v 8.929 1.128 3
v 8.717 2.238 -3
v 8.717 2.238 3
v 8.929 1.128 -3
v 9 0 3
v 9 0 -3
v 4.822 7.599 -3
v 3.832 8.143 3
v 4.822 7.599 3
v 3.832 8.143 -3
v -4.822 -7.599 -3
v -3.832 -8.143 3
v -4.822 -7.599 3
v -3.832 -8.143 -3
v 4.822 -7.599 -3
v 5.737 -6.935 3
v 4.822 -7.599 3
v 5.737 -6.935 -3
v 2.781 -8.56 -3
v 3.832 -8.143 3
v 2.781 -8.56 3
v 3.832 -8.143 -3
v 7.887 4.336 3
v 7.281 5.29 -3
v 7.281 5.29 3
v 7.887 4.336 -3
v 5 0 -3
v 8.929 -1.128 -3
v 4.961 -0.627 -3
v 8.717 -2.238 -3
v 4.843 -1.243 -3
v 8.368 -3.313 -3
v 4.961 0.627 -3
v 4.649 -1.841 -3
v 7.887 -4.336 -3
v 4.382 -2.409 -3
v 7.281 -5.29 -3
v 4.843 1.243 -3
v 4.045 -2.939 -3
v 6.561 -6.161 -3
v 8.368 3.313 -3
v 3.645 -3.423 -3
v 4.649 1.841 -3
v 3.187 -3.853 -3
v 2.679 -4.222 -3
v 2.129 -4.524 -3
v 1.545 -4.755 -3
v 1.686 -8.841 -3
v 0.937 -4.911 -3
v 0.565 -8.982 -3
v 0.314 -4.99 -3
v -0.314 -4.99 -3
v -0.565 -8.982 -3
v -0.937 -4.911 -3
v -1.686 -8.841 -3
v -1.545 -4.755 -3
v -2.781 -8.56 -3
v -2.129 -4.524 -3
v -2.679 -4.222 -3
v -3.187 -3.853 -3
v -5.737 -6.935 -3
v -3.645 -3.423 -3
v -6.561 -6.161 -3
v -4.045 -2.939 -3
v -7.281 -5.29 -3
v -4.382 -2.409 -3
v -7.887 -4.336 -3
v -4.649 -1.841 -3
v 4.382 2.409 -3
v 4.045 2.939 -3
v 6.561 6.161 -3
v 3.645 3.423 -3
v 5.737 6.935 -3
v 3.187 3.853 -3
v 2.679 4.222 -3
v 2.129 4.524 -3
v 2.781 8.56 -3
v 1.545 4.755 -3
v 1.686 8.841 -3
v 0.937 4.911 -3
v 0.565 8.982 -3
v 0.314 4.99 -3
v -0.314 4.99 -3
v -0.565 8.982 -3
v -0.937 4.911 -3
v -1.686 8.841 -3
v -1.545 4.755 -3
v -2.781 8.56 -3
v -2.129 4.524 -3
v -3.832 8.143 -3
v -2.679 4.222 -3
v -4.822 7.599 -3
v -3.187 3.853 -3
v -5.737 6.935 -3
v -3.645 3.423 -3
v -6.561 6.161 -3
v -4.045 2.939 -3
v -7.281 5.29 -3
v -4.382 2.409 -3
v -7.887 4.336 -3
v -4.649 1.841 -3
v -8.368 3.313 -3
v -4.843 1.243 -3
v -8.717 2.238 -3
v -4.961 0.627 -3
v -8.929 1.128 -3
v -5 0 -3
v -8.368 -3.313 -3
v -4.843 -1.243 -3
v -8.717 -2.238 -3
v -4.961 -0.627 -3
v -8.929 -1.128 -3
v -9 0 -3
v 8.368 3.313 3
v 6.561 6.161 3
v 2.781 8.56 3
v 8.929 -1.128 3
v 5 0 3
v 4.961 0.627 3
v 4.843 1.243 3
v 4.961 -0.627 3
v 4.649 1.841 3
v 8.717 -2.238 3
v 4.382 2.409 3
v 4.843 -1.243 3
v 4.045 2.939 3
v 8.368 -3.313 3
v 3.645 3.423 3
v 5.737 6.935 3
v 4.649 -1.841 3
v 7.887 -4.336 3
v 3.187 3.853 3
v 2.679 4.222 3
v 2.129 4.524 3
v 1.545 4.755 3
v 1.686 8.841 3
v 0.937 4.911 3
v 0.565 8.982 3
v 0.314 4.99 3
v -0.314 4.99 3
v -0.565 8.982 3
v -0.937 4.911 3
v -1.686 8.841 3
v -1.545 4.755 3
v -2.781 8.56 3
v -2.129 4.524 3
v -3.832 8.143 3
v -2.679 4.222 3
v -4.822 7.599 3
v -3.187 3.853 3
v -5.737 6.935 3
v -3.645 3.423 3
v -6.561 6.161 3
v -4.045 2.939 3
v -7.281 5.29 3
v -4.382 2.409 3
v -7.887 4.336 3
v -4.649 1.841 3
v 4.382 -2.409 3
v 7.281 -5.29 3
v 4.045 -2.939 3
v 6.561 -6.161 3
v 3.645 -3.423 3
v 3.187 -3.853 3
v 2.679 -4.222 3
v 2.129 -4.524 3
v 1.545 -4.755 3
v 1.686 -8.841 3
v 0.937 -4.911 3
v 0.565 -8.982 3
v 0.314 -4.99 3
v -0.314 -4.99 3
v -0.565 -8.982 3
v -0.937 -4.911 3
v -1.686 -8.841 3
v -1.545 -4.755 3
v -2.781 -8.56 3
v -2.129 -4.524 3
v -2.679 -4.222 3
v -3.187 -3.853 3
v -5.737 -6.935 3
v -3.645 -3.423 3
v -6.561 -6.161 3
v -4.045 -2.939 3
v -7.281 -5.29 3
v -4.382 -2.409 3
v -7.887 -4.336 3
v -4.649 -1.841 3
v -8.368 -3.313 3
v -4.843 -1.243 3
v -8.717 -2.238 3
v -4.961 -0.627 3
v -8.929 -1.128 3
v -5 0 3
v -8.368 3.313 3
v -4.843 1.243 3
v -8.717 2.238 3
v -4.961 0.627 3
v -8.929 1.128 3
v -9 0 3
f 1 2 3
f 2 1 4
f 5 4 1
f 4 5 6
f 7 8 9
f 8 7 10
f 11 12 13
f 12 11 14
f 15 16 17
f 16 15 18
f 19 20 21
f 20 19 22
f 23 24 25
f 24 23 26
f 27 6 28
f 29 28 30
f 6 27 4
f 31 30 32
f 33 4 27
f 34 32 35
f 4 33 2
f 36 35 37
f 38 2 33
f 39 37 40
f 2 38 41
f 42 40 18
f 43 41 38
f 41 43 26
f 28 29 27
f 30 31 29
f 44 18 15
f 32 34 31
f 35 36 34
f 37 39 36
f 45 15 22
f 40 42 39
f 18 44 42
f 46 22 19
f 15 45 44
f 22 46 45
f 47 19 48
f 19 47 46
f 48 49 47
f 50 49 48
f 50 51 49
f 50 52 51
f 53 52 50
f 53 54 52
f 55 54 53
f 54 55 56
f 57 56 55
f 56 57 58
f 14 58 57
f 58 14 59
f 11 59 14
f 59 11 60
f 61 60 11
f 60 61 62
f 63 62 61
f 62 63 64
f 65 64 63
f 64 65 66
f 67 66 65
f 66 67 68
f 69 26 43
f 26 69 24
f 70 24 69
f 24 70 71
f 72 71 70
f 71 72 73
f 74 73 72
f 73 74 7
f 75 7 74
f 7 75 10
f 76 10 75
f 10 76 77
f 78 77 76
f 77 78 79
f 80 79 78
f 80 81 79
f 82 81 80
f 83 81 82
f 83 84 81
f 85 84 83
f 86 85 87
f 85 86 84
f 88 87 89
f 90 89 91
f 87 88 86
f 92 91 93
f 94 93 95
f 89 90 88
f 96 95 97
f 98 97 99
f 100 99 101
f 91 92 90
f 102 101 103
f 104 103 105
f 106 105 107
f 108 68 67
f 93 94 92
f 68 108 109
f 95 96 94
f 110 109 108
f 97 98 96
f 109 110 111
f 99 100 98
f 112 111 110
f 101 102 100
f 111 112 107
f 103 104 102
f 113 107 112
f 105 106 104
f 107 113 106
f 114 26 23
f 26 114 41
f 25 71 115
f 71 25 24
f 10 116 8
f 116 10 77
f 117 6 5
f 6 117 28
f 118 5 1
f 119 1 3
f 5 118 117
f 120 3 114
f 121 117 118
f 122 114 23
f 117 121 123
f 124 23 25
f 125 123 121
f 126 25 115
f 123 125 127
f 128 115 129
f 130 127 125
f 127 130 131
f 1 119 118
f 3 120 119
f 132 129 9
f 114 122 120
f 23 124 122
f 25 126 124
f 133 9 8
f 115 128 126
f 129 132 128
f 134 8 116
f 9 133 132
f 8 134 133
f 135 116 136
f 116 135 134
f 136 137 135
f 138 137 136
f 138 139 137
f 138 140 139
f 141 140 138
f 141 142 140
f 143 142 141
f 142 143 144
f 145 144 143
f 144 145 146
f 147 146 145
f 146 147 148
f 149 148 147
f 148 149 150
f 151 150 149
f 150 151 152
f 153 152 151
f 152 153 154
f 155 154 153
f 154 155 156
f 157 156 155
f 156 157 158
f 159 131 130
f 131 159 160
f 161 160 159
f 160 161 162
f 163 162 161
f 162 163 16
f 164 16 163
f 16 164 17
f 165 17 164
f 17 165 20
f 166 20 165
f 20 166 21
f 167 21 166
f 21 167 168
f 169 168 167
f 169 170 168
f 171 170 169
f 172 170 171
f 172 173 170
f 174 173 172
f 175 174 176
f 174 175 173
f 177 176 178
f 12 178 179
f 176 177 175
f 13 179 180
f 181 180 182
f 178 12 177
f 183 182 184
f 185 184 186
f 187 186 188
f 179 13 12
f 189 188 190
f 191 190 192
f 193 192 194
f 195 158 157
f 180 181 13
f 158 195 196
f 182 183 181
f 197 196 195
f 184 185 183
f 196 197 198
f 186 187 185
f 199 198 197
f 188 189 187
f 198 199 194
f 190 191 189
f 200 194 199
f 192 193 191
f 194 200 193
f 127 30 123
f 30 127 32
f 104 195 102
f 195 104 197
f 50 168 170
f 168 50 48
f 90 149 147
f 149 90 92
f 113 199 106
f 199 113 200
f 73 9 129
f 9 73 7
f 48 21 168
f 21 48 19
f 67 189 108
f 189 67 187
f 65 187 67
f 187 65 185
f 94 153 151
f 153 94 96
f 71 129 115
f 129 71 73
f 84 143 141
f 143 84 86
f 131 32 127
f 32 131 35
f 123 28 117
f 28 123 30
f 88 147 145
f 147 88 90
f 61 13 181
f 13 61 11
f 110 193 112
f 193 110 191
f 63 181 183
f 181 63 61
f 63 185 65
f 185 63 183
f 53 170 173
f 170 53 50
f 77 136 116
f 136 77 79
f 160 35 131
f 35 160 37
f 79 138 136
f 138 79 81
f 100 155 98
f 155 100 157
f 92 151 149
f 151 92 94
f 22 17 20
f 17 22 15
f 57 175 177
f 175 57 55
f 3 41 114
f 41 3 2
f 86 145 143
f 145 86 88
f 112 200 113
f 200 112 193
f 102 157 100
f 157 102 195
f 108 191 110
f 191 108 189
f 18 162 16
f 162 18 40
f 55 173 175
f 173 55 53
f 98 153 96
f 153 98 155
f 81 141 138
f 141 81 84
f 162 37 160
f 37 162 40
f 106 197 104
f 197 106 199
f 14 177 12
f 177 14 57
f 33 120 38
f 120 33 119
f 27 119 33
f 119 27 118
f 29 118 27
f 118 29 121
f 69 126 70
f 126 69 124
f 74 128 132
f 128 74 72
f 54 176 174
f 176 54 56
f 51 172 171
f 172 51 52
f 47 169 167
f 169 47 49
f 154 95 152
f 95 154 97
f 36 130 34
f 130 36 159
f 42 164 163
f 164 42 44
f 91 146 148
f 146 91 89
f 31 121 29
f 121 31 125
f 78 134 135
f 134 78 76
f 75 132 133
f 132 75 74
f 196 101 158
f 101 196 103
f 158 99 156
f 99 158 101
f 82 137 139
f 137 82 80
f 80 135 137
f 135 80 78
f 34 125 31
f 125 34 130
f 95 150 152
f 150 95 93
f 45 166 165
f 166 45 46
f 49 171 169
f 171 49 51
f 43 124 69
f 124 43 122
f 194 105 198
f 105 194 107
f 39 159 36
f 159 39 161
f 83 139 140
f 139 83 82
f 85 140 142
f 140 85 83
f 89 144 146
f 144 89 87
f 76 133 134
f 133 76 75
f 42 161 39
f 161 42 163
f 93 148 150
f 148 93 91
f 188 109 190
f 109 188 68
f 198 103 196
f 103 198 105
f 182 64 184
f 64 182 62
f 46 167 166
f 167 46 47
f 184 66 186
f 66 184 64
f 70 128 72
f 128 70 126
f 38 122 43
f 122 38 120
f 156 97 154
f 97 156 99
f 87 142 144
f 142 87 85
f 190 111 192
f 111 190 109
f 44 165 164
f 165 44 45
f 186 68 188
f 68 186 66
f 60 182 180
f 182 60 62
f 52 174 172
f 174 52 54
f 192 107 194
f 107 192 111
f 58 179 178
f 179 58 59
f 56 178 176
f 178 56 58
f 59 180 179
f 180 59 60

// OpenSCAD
$fn = 50;


difference() {
	union() {
		translate(v = [0, 0, -3.0000000000]) {
			cylinder(h = 6, r = 9.0000000000);
		}
	}
	union() {
		translate(v = [0, 0, -100.0000000000]) {
			cylinder(h = 200, r = 5.0000000000);
		}
	}
}
